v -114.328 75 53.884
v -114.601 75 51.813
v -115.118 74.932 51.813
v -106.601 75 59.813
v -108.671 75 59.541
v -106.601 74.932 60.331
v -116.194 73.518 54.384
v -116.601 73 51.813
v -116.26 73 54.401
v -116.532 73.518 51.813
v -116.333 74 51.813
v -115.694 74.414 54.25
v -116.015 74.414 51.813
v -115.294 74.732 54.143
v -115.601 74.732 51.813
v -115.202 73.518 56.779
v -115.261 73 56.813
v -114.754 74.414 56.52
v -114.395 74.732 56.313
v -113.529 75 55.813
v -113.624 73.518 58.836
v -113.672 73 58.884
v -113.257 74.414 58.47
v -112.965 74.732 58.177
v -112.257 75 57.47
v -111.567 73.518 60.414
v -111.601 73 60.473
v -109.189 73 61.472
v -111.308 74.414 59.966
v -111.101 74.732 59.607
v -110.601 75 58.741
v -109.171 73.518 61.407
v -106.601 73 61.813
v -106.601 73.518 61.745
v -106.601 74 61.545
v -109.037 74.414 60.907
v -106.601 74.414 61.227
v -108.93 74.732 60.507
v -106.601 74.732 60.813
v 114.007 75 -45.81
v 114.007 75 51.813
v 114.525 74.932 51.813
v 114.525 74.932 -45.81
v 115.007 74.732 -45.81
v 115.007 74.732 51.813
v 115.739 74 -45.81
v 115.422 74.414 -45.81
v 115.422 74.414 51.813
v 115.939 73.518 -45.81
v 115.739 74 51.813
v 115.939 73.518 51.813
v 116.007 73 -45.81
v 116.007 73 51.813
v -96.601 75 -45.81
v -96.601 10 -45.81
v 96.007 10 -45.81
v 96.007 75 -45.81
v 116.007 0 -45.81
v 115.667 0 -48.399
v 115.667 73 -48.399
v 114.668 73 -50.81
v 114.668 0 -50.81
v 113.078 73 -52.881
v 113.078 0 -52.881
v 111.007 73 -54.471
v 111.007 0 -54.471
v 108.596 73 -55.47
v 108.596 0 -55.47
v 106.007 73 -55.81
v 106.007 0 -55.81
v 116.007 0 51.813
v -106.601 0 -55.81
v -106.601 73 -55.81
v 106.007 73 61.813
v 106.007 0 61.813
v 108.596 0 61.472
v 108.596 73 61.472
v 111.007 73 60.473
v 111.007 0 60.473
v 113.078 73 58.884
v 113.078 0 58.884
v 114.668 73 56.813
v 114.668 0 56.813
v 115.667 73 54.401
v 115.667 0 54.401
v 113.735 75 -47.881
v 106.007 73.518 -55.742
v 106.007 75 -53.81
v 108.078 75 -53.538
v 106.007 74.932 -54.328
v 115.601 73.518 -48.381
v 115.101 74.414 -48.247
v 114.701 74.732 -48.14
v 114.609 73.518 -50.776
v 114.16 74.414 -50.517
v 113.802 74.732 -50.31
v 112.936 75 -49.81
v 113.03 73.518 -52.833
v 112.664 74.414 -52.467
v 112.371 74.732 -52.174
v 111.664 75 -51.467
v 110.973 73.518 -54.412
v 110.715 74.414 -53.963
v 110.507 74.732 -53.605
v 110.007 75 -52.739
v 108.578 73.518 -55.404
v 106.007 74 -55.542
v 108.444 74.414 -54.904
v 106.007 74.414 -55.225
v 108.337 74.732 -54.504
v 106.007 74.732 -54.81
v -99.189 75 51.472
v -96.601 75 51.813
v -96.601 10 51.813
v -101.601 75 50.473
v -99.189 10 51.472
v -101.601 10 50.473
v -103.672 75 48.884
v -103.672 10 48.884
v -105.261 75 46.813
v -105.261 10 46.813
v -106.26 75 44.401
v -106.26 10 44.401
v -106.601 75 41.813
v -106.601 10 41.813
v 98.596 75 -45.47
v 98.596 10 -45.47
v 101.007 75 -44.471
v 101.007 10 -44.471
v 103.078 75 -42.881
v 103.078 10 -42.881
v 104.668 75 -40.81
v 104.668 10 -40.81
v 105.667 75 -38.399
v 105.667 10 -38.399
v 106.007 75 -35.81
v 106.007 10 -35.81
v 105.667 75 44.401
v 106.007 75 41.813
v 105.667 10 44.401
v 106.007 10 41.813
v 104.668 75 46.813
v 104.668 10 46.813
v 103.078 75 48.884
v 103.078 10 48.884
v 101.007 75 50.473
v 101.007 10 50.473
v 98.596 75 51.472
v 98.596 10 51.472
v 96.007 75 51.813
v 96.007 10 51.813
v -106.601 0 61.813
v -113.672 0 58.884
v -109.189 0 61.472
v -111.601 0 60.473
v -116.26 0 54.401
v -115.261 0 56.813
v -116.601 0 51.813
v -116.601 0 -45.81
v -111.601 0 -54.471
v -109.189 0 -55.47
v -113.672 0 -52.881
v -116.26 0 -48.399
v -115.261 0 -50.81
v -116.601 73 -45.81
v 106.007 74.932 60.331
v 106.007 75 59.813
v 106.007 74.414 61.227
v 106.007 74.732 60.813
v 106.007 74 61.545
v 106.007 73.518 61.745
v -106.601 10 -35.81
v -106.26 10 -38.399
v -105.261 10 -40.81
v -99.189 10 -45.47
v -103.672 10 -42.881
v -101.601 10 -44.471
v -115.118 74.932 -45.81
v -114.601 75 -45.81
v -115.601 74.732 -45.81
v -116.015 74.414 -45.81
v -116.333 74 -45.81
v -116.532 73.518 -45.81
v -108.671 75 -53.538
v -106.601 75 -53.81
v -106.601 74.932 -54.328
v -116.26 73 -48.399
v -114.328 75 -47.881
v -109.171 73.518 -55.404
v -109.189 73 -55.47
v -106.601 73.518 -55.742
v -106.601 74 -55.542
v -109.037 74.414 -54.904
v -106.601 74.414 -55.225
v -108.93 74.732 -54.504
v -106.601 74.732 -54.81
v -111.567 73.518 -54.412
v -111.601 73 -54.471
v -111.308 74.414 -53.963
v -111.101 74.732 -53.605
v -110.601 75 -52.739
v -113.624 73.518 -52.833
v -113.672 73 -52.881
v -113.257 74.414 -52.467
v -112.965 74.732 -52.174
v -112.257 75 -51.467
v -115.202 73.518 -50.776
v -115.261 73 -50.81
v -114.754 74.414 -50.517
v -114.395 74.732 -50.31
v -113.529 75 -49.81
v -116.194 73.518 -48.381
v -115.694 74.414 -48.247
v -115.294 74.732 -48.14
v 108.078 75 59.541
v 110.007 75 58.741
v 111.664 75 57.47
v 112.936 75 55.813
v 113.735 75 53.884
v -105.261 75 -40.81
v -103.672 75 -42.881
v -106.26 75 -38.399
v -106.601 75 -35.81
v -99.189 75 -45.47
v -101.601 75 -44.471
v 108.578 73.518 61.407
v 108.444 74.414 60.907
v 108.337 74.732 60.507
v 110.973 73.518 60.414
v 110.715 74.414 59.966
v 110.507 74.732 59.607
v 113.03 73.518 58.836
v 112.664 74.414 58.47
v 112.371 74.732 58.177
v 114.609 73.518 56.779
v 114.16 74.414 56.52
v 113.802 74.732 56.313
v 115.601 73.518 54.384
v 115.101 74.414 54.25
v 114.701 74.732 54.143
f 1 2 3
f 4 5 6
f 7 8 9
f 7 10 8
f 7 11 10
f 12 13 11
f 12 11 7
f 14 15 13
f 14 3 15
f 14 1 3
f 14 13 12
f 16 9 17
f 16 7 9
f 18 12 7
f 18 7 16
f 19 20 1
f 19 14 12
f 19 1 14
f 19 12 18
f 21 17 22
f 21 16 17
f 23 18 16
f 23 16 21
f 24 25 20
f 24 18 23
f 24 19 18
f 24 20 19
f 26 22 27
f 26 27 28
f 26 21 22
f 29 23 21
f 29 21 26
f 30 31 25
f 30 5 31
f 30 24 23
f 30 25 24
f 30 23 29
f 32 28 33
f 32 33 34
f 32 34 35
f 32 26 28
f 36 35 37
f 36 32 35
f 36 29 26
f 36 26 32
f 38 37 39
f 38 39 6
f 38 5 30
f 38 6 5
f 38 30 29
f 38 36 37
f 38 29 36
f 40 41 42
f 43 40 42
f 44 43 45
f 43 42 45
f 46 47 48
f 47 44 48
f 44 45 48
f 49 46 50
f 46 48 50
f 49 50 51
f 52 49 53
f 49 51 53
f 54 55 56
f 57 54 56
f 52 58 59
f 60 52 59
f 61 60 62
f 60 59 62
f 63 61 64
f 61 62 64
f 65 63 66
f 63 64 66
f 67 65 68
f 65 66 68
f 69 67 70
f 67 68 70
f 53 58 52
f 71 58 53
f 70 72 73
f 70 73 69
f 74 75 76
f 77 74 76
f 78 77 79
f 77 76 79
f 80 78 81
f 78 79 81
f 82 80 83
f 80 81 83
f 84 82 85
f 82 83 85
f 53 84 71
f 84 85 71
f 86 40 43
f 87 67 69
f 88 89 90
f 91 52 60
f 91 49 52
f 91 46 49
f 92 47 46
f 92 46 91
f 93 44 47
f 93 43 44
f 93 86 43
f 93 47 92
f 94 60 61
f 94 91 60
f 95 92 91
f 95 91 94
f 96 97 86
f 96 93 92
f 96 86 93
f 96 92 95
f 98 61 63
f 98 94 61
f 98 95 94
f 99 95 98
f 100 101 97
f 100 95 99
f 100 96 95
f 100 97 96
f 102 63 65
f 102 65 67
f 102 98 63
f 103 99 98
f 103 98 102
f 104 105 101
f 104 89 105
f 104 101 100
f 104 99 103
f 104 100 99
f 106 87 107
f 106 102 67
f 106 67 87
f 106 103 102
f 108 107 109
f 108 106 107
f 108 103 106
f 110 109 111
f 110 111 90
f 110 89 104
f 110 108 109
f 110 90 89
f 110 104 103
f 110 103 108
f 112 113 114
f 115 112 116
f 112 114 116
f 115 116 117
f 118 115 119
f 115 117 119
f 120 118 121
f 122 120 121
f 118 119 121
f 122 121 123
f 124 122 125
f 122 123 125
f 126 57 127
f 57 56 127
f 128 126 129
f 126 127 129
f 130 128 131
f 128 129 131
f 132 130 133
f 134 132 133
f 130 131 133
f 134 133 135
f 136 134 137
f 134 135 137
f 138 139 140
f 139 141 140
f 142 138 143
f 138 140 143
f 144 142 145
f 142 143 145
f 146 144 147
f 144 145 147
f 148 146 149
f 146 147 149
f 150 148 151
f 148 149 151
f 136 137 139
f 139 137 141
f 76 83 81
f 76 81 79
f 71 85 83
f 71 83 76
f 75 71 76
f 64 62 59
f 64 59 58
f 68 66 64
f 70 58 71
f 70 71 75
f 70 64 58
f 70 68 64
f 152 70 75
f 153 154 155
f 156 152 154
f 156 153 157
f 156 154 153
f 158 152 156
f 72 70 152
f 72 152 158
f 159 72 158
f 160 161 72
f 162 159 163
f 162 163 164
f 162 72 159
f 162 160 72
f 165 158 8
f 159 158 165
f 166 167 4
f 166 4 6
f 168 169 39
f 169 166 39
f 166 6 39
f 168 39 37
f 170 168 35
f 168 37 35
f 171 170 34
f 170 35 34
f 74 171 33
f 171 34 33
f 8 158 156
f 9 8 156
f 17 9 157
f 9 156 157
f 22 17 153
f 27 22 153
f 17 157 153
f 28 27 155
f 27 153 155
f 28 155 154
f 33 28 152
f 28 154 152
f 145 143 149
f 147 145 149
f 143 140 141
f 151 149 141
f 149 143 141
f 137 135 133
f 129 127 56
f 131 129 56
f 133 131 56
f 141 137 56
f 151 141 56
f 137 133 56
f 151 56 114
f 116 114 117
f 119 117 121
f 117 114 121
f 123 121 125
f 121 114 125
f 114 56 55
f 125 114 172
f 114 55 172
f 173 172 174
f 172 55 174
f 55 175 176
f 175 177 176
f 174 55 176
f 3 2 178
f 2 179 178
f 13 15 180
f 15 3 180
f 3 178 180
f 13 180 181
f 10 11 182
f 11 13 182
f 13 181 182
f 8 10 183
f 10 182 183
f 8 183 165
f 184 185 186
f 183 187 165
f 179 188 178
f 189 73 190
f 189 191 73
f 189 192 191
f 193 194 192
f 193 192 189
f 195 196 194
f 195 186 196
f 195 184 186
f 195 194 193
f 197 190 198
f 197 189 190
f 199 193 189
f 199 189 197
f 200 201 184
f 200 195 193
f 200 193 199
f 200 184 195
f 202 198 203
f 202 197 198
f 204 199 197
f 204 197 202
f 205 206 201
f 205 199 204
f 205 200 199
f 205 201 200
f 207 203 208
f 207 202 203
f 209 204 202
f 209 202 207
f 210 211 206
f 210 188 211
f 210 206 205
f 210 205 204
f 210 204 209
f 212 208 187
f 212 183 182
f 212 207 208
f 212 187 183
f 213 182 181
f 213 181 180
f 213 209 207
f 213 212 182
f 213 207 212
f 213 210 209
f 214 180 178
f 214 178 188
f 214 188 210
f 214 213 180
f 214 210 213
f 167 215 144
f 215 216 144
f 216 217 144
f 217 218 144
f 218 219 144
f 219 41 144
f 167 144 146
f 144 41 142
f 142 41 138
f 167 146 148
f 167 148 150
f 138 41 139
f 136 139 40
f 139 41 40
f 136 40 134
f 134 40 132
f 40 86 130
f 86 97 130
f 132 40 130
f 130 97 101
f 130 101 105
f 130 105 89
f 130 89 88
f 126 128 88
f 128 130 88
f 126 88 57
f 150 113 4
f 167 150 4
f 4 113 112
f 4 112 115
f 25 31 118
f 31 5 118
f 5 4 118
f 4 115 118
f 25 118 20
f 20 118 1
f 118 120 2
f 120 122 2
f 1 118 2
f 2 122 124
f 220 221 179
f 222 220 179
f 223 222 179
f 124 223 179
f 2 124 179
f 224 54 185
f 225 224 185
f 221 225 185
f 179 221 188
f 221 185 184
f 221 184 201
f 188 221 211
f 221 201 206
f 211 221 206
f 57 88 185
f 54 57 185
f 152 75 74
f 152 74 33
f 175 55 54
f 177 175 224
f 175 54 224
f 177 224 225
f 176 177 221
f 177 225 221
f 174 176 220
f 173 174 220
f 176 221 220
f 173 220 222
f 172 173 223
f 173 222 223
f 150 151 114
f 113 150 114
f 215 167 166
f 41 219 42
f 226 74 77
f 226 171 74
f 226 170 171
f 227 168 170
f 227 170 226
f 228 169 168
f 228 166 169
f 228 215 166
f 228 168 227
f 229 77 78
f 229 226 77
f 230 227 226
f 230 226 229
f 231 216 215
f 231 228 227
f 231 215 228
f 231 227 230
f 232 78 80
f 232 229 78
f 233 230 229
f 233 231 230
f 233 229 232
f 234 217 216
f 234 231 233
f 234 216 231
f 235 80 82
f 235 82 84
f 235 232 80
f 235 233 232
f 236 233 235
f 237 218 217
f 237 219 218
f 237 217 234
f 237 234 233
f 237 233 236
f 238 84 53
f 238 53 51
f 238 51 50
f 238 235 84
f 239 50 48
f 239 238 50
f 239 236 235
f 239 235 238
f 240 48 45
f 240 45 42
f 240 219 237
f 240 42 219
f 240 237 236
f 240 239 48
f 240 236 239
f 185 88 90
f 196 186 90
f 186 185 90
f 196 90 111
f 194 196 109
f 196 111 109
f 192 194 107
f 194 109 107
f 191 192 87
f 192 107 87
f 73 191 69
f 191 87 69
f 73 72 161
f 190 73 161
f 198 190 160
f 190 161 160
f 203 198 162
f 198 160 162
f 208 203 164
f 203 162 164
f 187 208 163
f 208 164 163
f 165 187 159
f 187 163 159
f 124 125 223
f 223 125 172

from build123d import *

# Parameters (mm, degrees)
BOSS_EXTRUDE1_DEPTH = 75
SHELL13_T           = -10
FILLET5_R           = 10
FILLET8_R           = 2
FILLET9_R           = 10


with BuildPart() as part:
    # Sketch1 → Boss-Extrude1 (new body)
    with BuildSketch(Plane(origin=(0, 0, 0), x_dir=(1, 0, 0), z_dir=(0, 1, 0))):
        Polygon((-116.60063424078889, 55.81031027640047), (116.00742939980823, 55.81031027640047), (116.00742939980825, -61.81321623229694), (-116.60063424078888, -61.81321623229694), align=None)
    extrude(amount=BOSS_EXTRUDE1_DEPTH)

    # Shell13
    shell13_openings = [part.faces().sort_by_distance(p)[0] for p in [
        (-0.29660242, 75, 3.001452978),
    ]]
    offset(amount=SHELL13_T, openings=shell13_openings, kind=Kind.INTERSECTION)

    # Fillet5
    fillet5_edges = [part.edges().sort_by_distance(p)[0] for p in [
        (-106.60063424078889, 42.5, -45.81031027640047),
        (-106.60063424078889, 42.5, 51.81321623229694),
        (106.00742939980825, 42.5, 51.81321623229694),
        (106.00742939980823, 42.5, -45.81031027640047),
    ]]
    fillet(fillet5_edges, radius=FILLET5_R)

    # Fillet8
    fillet8_edges = [part.edges().sort_by_distance(p)[0] for p in [
        (116.00742939980825, 75, 3.001452977948233),
        (-0.2966024204903306, 75, -55.81031027640047),
        (-116.60063424078888, 75, 3.001452977948233),
        (-0.2966024204903164, 75, 61.81321623229694),
    ]]
    fillet(fillet8_edges, radius=FILLET8_R)

    # Fillet9
    # the kernel refuses this fillet: 10 mm, written as the material it takes off along each edge
    with BuildSketch(Plane(origin=(106.00742939980825, 75, 51.81321623229694), x_dir=(0, 0, 1), z_dir=(-1, 0, 0))) as fillet9_piece_1:
        with BuildLine():
            CenterArc((8, -2), 2, 0, 90)
            Line((10, -2), (10, 0))
            Line((10, 0), (8, 0))
        make_face()
    revolve(axis=Axis((106.00742939980825, 75, 51.81321623229694), (0, 1, 0)), revolution_arc=90.00000000000001, mode=Mode.SUBTRACT)
    with BuildSketch(Plane(origin=(-106.60063424078888, 75, 51.81321623229694), x_dir=(-1, 0, 1.2e-16), z_dir=(-1.2e-16, 0, -1))) as fillet9_piece_2:
        with BuildLine():
            CenterArc((8, -2), 2, 0, 90)
            Line((10, -2), (10, 0))
            Line((10, 0), (8, 0))
        make_face()
    revolve(axis=Axis((-106.60063424078888, 75, 51.81321623229694), (0, 1, 0)), revolution_arc=90, mode=Mode.SUBTRACT)
    with BuildSketch(Plane(origin=(106.00742939980823, 75, -45.81031027640047), x_dir=(1, 0, -1.2e-16), z_dir=(1.2e-16, 0, 1))) as fillet9_piece_3:
        with BuildLine():
            CenterArc((8, -2), 2, 0, 90)
            Line((10, -2), (10, 0))
            Line((10, 0), (8, 0))
        make_face()
    revolve(axis=Axis((106.00742939980823, 75, -45.81031027640047), (0, 1, 0)), revolution_arc=90, mode=Mode.SUBTRACT)
    with BuildSketch(Plane(origin=(-106.60063424078889, 75, -45.81031027640047), x_dir=(0, 0, -1), z_dir=(1, 0, 0))) as fillet9_piece_4:
        with BuildLine():
            CenterArc((8, -2), 2, 0, 90)
            Line((10, -2), (10, 0))
            Line((10, 0), (8, 0))
        make_face()
    revolve(axis=Axis((-106.60063424078889, 75, -45.81031027640047), (0, 1, 0)), revolution_arc=90.00000000000001, mode=Mode.SUBTRACT)
    with BuildSketch(Plane(origin=(-116.60063424078889, -25, -55.81031027640047), x_dir=(1, 0, 0), z_dir=(0, 1, 0)), Plane(origin=(116.00742939980823, -25, -55.81031027640047), x_dir=(0, 0, 1), z_dir=(0, 1, 0))) as fillet9_piece_5:
        with BuildLine():
            CenterArc((FILLET9_R, -FILLET9_R), FILLET9_R, 90, 90)
            Line((0, -FILLET9_R), (0, 0))
            Line((0, 0), (FILLET9_R, 0))
        make_face()
    extrude(amount=100.00000000000001, mode=Mode.SUBTRACT)
    with BuildSketch(Plane(origin=(-116.60063424078888, -25, 61.81321623229694), x_dir=(1, 0, 0), z_dir=(0, 1, 0)), Plane(origin=(116.00742939980825, -25, 61.81321623229694), x_dir=(0, 0, -1), z_dir=(0, 1, 0))) as fillet9_piece_6:
        with BuildLine():
            CenterArc((FILLET9_R, FILLET9_R), FILLET9_R, 180, 90)
            Line((0, FILLET9_R), (0, 0))
            Line((0, 0), (FILLET9_R, 0))
        make_face()
    extrude(amount=100.00000000000001, mode=Mode.SUBTRACT)


solid = part.part
